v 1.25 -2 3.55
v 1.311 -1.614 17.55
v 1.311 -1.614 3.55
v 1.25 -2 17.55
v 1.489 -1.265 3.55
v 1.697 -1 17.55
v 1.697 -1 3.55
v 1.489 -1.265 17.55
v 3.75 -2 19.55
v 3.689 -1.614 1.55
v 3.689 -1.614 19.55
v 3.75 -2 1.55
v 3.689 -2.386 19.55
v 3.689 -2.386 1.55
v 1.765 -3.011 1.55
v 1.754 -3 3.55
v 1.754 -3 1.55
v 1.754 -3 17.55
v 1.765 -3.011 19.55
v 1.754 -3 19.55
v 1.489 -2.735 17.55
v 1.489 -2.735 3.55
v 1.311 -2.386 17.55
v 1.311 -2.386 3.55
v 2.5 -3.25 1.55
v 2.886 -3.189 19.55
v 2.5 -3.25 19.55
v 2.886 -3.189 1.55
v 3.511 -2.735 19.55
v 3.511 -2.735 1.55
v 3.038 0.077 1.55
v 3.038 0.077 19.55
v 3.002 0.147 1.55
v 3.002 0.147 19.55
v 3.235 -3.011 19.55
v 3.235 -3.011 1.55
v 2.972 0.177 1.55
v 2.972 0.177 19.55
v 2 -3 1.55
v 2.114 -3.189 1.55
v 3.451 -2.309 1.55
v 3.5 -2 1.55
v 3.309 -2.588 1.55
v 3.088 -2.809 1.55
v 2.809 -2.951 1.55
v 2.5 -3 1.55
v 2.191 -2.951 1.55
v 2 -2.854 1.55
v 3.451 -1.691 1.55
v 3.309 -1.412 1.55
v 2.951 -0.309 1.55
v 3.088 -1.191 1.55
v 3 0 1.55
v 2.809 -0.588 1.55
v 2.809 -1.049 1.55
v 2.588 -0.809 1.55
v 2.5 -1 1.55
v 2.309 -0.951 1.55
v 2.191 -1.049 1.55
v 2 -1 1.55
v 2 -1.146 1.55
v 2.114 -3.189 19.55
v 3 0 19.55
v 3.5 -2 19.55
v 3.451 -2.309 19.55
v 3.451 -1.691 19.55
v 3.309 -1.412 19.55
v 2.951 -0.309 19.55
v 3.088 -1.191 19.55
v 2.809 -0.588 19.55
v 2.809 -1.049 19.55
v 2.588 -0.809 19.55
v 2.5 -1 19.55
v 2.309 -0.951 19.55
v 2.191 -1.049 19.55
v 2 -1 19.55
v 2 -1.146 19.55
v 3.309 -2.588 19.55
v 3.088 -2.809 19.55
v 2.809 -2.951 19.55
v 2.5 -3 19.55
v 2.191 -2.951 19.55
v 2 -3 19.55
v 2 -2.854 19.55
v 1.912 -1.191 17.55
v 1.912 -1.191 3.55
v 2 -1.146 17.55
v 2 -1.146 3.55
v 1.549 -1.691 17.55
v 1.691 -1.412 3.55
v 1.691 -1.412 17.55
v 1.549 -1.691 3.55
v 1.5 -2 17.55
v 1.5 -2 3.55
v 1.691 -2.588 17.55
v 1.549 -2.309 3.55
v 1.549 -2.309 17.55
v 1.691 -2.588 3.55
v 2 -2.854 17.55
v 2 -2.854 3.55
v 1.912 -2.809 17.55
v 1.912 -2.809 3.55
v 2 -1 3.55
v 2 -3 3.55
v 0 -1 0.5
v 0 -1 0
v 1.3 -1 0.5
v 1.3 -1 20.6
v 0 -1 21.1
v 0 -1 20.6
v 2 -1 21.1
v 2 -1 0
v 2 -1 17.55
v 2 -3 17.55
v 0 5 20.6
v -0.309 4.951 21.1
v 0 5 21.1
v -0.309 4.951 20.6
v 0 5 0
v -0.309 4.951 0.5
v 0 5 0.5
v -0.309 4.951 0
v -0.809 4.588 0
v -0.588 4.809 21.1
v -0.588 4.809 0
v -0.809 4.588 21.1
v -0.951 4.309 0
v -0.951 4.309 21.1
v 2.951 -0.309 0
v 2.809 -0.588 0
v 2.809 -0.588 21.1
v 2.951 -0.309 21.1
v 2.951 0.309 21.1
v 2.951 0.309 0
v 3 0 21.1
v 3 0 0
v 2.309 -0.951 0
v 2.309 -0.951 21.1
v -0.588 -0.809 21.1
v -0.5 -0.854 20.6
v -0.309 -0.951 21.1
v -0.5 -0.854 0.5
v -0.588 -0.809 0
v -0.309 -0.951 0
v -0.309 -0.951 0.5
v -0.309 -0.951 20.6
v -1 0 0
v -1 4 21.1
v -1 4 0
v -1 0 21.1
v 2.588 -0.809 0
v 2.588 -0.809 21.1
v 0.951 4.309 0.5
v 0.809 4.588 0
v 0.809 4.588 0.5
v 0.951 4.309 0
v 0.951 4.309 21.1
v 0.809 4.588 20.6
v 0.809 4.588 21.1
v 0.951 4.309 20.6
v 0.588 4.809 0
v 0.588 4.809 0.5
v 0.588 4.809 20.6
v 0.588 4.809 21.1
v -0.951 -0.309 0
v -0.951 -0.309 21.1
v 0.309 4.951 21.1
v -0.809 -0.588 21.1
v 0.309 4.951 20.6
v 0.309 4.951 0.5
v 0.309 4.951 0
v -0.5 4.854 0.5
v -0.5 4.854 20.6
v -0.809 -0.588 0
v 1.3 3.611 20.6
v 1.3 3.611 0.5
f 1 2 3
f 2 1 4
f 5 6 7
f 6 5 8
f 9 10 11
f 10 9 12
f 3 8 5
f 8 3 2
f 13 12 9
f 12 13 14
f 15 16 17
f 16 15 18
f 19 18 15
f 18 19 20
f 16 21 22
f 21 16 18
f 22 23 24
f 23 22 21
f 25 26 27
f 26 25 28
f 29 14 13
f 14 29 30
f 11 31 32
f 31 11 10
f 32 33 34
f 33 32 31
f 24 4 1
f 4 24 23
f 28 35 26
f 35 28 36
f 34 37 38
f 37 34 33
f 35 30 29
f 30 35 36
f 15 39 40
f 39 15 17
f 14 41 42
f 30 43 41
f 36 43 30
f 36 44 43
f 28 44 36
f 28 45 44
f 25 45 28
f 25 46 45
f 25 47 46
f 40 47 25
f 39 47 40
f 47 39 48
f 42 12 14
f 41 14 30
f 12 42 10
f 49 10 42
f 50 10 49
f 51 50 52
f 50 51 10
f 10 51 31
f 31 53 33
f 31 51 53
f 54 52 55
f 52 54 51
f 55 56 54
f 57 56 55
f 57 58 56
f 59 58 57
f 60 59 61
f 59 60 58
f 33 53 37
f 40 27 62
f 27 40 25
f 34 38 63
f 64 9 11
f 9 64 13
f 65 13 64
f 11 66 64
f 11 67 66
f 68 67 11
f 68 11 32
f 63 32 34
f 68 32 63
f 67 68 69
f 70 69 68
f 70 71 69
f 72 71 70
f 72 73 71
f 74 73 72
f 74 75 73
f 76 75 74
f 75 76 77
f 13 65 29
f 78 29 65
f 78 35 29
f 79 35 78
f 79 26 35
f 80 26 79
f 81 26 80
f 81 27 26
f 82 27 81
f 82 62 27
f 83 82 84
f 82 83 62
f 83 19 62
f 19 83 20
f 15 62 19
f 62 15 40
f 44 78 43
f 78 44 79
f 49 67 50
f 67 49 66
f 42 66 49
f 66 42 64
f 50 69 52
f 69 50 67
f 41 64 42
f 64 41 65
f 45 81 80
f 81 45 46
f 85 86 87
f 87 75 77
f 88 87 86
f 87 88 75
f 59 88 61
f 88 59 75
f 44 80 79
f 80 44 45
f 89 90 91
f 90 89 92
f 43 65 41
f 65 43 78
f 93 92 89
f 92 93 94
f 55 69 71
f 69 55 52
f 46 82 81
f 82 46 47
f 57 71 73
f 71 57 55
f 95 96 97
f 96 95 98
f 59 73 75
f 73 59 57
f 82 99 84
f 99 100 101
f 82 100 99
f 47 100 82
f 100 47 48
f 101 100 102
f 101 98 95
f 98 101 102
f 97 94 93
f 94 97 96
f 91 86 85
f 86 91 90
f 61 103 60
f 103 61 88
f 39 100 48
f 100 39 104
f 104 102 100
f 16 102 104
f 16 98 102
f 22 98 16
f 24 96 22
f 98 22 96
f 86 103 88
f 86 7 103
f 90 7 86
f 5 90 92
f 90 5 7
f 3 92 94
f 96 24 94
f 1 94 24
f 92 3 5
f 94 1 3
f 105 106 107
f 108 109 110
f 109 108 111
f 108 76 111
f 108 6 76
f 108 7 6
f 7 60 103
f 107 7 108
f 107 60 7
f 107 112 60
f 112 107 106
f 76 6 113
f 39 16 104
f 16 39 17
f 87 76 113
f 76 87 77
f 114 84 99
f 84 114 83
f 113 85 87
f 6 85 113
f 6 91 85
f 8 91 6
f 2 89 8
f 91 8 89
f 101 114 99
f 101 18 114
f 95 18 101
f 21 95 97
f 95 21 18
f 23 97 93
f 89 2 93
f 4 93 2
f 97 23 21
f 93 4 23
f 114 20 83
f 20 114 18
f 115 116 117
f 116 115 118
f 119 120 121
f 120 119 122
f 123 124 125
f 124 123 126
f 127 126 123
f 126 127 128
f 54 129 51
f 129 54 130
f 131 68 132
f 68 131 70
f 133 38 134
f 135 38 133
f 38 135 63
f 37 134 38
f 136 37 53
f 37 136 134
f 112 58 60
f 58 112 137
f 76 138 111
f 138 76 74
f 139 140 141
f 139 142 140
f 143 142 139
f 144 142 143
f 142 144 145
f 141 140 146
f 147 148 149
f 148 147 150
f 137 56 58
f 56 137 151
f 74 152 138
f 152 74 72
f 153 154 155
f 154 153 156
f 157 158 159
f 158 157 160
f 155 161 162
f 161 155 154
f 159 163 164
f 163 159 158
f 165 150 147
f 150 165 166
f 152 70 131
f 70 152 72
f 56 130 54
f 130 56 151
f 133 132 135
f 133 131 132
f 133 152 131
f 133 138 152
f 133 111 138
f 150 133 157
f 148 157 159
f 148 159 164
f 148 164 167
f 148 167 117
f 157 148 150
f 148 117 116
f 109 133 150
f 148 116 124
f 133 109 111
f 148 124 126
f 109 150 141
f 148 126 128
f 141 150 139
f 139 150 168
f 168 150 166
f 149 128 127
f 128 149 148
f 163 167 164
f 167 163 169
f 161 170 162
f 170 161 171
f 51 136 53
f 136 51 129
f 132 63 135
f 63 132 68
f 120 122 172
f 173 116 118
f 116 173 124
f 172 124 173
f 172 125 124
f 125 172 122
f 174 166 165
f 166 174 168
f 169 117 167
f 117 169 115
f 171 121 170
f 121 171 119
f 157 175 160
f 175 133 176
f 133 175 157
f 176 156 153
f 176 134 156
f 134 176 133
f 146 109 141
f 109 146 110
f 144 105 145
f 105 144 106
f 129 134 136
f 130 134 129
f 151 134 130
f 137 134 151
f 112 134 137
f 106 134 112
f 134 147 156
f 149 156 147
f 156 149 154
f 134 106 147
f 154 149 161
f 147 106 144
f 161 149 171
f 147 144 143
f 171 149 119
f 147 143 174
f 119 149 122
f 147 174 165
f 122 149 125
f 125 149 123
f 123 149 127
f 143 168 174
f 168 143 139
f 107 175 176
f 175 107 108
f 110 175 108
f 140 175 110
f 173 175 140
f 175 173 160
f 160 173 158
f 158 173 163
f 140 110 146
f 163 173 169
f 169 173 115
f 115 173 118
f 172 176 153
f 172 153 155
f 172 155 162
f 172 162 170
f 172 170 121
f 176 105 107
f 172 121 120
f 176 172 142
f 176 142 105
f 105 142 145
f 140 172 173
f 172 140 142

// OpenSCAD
$fn=20;

lug_width = 18;
lug_od = 2.5;
lug_id = 2;
lug_tool_slot = 2;

strap_width=20.1;
strap_h = 1.8;
strap_wall_h=0.5;

tot_width1 = strap_width + 1;
tot_width2 = strap_width + 1;

h1 = 5;
h2 = 2;



l=4;
offset = 0.5*(tot_width1-lug_width);

off_x = 2;
off_z = 0.5*(tot_width1-tot_width2);

module lug_part() {
difference() {
    hull(){
    cylinder(d=lug_od, h=lug_width);
    translate([0.5*lug_id-0.7, lug_id, 0]) cylinder(d=0.5, h=lug_width);
    }
    cylinder(d=lug_id, h=lug_width);
    translate([-lug_id+0.5, -1, 0]) cube([1,2,lug_tool_slot]);
    translate([-lug_id+0.5, -1, lug_width-lug_tool_slot]) cube([1,2,lug_tool_slot]);
}
}

module strap_part() {
difference() {
  hull() {
    cylinder(d=2, h=tot_width1);
    translate([off_x, 0, off_z]) cylinder(d=2, h=tot_width2);
    translate([0, l, off_z]) cylinder(d=2, h=tot_width2);
  }
  translate([-(1-strap_wall_h), -0.5*l, 0.5*(tot_width1-strap_width)]) cube([strap_h, l*2, strap_width]);
}
}

translate([off_x+0.5, -lug_id, offset]) 
  lug_part();
strap_part();
